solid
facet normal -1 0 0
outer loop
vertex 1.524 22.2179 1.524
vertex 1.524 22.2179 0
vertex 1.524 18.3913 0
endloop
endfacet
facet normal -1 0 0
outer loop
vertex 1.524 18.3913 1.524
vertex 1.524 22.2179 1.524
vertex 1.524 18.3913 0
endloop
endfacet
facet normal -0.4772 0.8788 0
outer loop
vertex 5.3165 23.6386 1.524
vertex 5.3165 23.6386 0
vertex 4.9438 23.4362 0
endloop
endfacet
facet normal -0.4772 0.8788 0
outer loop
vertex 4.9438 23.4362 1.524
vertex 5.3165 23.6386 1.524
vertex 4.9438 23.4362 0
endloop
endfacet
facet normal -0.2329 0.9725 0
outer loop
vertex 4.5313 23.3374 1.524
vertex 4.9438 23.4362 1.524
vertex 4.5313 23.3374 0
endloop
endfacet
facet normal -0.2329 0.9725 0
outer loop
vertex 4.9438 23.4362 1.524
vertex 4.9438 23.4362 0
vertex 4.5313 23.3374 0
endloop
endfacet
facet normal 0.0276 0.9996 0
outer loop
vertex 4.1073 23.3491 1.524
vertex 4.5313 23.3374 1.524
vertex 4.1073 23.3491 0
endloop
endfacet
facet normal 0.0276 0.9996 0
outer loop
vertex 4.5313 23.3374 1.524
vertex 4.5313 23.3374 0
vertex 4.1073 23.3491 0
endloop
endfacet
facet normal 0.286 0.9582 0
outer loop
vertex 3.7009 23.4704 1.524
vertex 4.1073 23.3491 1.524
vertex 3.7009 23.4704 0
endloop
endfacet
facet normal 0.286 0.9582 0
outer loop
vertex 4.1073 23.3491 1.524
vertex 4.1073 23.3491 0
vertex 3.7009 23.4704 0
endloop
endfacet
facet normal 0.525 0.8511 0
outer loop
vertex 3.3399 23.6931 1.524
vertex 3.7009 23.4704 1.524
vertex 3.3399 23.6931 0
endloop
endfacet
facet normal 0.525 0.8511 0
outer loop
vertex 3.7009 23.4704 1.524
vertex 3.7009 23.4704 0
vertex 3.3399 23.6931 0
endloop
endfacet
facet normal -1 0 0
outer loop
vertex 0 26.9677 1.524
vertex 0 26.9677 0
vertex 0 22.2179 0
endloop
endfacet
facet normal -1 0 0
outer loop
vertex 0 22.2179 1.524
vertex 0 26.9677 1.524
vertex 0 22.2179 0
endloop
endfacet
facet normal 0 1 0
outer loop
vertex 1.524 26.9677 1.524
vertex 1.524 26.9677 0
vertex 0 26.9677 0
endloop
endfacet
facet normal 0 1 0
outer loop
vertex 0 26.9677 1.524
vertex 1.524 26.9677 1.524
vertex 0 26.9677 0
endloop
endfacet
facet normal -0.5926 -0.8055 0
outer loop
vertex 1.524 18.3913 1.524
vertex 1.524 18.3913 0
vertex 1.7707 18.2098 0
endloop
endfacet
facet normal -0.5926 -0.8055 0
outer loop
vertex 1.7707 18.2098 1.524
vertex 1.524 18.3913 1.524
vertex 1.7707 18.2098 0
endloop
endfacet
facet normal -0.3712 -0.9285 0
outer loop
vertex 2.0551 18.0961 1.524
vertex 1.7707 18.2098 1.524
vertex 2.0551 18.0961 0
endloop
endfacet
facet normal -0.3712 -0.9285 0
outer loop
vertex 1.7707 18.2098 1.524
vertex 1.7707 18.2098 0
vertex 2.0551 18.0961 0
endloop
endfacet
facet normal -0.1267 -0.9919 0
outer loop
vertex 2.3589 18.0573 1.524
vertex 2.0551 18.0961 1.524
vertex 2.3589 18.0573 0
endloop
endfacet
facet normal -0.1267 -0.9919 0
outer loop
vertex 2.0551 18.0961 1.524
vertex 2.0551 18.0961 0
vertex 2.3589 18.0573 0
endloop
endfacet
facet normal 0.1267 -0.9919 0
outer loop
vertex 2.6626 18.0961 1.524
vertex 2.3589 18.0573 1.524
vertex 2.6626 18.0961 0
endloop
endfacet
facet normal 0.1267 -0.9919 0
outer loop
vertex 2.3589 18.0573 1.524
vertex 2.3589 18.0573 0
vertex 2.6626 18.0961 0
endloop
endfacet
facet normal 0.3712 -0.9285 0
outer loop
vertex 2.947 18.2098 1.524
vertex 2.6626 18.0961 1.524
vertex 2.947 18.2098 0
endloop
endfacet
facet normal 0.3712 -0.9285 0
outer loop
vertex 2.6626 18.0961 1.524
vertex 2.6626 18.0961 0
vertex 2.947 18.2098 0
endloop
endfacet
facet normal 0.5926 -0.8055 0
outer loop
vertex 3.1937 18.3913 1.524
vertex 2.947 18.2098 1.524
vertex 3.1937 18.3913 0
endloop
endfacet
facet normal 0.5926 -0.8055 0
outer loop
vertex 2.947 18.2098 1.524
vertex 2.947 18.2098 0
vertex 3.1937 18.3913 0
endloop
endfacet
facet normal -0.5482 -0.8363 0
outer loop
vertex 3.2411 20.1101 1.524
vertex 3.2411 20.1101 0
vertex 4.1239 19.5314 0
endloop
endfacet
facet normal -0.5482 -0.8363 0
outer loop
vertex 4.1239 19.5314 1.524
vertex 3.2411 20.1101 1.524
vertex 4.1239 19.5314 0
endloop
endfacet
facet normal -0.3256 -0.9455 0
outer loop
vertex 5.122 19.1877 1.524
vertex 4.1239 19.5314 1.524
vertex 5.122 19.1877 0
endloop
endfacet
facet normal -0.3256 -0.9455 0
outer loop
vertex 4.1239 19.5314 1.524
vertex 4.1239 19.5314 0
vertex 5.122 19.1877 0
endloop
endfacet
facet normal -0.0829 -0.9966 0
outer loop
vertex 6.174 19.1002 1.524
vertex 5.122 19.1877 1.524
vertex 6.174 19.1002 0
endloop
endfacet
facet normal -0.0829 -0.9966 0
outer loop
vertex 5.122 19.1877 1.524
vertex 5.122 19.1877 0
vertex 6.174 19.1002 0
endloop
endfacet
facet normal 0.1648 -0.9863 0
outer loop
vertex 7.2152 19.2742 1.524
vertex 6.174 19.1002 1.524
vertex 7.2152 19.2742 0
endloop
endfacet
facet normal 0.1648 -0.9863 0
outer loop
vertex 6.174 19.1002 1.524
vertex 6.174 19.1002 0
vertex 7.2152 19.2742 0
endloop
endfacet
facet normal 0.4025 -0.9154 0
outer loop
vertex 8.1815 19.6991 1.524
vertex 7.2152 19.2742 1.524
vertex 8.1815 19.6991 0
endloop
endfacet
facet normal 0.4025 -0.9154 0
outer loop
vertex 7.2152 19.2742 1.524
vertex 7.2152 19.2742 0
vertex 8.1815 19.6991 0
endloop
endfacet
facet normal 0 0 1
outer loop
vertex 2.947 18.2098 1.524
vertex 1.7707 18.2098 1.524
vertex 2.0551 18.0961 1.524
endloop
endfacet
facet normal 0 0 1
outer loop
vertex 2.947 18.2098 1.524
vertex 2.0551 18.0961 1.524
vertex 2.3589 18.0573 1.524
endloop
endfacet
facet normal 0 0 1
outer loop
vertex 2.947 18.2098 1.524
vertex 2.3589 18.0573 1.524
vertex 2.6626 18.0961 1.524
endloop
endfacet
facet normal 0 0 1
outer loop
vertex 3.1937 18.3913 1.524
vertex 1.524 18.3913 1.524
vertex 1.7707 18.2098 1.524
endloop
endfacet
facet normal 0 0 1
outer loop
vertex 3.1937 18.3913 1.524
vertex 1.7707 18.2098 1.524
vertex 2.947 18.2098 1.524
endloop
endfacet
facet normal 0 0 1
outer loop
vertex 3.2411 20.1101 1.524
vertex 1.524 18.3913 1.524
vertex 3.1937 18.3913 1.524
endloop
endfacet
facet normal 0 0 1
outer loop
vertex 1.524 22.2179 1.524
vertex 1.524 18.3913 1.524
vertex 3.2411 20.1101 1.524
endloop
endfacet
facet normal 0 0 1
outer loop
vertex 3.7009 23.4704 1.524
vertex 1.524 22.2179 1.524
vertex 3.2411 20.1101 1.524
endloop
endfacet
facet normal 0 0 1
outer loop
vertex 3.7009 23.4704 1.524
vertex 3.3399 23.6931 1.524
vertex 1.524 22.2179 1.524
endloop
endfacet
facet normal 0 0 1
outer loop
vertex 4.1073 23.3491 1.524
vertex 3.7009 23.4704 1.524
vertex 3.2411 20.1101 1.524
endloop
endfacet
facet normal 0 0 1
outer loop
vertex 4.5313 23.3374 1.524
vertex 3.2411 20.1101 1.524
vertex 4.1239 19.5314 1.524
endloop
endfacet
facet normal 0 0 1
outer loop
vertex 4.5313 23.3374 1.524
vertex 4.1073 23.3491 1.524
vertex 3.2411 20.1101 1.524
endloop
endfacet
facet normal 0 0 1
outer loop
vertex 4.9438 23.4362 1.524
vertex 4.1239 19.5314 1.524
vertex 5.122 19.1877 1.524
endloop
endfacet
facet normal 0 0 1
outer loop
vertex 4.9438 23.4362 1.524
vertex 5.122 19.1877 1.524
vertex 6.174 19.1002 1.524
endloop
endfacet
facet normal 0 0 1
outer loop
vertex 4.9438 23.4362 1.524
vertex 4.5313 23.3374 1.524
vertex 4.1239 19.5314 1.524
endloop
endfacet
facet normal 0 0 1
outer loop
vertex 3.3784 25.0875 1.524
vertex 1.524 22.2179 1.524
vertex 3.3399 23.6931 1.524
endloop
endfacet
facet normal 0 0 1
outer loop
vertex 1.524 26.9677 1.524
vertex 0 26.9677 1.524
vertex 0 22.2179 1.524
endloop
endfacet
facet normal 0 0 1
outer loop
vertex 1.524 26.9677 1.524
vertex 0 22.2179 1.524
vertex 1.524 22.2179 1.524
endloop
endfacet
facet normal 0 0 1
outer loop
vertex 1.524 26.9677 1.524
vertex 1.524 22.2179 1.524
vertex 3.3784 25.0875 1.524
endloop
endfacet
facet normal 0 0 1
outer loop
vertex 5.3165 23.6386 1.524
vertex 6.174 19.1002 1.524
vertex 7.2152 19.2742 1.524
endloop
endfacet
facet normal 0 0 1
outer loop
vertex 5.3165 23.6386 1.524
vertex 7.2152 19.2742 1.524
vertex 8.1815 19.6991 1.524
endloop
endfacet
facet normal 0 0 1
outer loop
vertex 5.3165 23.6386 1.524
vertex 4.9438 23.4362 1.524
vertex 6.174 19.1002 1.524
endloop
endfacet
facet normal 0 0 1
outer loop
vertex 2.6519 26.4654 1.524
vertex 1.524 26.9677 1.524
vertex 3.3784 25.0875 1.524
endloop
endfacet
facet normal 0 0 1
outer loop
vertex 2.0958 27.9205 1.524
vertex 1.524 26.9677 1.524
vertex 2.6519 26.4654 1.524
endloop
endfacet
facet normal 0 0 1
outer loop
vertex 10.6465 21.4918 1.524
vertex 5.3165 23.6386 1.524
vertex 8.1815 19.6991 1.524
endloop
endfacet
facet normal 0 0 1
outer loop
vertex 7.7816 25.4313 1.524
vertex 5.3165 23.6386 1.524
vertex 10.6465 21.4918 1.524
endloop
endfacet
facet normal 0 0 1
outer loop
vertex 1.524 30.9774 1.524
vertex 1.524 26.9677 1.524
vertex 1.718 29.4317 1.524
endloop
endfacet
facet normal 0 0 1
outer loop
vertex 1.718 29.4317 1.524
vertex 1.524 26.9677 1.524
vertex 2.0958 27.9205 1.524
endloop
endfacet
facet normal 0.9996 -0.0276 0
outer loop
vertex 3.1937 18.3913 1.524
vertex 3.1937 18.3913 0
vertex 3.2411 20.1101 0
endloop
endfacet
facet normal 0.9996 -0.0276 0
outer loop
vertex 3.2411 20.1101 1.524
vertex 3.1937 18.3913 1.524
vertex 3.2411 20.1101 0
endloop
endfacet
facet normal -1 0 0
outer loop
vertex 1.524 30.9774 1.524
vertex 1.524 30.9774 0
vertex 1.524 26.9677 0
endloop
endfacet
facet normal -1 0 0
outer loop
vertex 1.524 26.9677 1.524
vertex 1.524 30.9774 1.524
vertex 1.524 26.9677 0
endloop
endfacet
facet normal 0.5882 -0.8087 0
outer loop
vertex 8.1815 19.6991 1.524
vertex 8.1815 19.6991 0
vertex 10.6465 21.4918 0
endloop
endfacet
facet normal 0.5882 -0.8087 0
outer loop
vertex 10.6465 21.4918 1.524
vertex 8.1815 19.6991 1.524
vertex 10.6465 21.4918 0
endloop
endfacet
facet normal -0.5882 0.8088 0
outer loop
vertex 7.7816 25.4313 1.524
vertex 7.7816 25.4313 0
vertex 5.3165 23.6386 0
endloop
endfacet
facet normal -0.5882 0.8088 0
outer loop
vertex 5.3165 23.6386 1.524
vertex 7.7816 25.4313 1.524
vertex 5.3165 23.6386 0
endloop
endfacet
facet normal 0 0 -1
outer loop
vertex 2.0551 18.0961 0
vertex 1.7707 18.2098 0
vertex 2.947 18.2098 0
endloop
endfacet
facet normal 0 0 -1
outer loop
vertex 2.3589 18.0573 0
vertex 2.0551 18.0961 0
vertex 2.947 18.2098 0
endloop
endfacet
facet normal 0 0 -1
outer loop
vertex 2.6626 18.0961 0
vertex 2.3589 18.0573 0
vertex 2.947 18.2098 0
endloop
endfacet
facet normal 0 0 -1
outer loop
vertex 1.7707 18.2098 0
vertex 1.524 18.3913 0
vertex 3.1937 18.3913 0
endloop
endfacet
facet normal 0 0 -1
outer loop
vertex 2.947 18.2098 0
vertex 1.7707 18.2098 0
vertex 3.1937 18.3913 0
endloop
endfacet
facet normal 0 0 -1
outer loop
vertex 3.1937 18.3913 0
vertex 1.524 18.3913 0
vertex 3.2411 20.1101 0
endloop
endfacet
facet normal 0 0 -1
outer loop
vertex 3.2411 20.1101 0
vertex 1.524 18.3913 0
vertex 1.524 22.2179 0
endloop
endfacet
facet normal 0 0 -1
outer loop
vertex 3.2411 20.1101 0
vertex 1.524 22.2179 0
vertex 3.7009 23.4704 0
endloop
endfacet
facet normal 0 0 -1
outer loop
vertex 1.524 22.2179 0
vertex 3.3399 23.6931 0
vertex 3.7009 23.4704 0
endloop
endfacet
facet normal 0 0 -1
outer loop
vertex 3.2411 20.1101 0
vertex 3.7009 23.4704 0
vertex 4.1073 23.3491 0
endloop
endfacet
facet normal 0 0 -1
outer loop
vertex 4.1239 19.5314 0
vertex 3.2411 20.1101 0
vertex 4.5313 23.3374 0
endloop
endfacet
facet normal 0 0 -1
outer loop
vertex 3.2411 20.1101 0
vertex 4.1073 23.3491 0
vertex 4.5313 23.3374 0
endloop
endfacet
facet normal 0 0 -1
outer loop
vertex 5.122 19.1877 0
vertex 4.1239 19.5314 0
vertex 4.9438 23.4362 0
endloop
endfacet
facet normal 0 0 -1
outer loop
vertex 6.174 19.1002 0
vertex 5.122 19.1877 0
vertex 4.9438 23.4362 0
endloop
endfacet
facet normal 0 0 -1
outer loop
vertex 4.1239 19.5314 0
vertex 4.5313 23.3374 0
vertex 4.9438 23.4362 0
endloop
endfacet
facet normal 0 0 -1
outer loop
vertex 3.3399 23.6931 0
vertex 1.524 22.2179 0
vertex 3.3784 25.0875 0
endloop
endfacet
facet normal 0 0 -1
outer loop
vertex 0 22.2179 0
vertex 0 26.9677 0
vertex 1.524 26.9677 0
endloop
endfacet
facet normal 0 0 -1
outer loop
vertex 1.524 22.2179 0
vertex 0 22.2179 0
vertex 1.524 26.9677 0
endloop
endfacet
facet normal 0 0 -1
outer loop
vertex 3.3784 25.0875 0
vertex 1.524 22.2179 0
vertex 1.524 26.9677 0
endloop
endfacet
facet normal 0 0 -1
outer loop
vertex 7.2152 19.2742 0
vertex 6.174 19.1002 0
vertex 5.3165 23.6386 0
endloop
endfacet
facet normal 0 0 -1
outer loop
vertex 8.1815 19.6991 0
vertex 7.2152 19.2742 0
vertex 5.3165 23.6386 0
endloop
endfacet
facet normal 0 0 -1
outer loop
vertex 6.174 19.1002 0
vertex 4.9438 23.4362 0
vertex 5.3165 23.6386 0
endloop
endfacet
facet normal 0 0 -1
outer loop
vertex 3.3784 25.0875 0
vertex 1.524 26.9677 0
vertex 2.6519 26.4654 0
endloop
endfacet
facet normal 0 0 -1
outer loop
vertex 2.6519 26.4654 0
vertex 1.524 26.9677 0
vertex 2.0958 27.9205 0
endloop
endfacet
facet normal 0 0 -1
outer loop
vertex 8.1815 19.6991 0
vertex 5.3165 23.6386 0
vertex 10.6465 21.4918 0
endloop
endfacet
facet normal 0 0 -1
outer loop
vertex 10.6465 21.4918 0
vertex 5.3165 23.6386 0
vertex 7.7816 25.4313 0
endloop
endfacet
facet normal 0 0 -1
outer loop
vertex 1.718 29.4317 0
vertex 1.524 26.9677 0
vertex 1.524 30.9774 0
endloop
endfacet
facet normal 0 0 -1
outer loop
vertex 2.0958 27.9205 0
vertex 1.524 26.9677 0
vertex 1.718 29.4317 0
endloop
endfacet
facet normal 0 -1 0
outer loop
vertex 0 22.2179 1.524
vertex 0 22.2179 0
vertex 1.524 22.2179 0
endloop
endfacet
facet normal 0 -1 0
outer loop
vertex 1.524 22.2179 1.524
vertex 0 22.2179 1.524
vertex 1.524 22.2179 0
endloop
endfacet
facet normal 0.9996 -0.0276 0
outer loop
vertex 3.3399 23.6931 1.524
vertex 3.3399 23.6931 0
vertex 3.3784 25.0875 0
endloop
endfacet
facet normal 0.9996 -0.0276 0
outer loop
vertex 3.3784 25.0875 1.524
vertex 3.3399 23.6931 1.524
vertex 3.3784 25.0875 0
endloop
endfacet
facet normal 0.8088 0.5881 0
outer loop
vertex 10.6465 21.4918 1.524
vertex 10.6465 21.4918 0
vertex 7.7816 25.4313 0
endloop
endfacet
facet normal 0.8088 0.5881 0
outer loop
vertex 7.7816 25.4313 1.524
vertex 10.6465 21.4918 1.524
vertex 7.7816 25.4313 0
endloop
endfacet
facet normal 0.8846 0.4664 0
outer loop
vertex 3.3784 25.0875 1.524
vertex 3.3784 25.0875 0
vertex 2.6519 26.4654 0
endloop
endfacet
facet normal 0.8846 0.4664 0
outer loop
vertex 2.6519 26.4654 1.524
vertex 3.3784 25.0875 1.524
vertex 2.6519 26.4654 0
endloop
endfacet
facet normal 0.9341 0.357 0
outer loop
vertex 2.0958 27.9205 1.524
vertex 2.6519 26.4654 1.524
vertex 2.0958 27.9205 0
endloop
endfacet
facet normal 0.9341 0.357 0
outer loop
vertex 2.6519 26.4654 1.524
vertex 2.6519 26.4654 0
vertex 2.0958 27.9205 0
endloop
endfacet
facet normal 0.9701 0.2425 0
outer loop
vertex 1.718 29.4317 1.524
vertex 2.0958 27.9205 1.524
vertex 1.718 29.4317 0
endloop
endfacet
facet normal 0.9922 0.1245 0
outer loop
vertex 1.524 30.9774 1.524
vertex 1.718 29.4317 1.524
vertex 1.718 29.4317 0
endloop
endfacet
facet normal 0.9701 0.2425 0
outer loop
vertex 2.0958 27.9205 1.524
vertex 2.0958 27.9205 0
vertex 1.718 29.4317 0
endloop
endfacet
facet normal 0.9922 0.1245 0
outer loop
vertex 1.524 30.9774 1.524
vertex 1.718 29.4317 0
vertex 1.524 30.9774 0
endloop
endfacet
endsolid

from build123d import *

# Parameters (mm, degrees)
BOSS_EXTRUDE1_DEPTH = 1.524


with BuildPart() as part:
    # Sketch1 → Boss-Extrude1 (new body)
    with BuildSketch(Plane.XY):
        with BuildLine():
            Line((1.524, 26.967680282), (0, 26.967680282))
            Line((0, 26.967680282), (0, 22.217880282))
            Line((0, 22.217880282), (1.524, 22.217880282))
            Line((1.524, 22.217880282), (1.524, 18.391271339))
            ThreePointArc((1.524, 18.391271339), (2.358852733, 18.057327031), (3.193705465, 18.391271339))
            Line((3.193705465, 18.391271339), (3.241105721, 20.110110457))
            ThreePointArc((3.241105721, 20.110110457), (5.645287311, 19.111172108), (8.181482071, 19.699120308))
            Line((8.181482071, 19.699120308), (10.646545317, 21.491818606))
            Line((10.646545317, 21.491818606), (7.781599903, 25.431283294))
            Line((7.781599903, 25.431283294), (5.316536657, 23.638584995))
            ThreePointArc((5.316536657, 23.638584995), (4.31894521, 23.329334303), (3.339913307, 23.693094141))
            Line((3.339913307, 23.693094141), (3.378365348, 25.087450992))
            ThreePointArc((3.378365348, 25.087450992), (2.095759725, 27.920506851), (1.524, 30.977363652))
            Line((1.524, 30.977363652), (1.524, 26.967680282))
        make_face()
    extrude(amount=BOSS_EXTRUDE1_DEPTH)


solid = part.part
